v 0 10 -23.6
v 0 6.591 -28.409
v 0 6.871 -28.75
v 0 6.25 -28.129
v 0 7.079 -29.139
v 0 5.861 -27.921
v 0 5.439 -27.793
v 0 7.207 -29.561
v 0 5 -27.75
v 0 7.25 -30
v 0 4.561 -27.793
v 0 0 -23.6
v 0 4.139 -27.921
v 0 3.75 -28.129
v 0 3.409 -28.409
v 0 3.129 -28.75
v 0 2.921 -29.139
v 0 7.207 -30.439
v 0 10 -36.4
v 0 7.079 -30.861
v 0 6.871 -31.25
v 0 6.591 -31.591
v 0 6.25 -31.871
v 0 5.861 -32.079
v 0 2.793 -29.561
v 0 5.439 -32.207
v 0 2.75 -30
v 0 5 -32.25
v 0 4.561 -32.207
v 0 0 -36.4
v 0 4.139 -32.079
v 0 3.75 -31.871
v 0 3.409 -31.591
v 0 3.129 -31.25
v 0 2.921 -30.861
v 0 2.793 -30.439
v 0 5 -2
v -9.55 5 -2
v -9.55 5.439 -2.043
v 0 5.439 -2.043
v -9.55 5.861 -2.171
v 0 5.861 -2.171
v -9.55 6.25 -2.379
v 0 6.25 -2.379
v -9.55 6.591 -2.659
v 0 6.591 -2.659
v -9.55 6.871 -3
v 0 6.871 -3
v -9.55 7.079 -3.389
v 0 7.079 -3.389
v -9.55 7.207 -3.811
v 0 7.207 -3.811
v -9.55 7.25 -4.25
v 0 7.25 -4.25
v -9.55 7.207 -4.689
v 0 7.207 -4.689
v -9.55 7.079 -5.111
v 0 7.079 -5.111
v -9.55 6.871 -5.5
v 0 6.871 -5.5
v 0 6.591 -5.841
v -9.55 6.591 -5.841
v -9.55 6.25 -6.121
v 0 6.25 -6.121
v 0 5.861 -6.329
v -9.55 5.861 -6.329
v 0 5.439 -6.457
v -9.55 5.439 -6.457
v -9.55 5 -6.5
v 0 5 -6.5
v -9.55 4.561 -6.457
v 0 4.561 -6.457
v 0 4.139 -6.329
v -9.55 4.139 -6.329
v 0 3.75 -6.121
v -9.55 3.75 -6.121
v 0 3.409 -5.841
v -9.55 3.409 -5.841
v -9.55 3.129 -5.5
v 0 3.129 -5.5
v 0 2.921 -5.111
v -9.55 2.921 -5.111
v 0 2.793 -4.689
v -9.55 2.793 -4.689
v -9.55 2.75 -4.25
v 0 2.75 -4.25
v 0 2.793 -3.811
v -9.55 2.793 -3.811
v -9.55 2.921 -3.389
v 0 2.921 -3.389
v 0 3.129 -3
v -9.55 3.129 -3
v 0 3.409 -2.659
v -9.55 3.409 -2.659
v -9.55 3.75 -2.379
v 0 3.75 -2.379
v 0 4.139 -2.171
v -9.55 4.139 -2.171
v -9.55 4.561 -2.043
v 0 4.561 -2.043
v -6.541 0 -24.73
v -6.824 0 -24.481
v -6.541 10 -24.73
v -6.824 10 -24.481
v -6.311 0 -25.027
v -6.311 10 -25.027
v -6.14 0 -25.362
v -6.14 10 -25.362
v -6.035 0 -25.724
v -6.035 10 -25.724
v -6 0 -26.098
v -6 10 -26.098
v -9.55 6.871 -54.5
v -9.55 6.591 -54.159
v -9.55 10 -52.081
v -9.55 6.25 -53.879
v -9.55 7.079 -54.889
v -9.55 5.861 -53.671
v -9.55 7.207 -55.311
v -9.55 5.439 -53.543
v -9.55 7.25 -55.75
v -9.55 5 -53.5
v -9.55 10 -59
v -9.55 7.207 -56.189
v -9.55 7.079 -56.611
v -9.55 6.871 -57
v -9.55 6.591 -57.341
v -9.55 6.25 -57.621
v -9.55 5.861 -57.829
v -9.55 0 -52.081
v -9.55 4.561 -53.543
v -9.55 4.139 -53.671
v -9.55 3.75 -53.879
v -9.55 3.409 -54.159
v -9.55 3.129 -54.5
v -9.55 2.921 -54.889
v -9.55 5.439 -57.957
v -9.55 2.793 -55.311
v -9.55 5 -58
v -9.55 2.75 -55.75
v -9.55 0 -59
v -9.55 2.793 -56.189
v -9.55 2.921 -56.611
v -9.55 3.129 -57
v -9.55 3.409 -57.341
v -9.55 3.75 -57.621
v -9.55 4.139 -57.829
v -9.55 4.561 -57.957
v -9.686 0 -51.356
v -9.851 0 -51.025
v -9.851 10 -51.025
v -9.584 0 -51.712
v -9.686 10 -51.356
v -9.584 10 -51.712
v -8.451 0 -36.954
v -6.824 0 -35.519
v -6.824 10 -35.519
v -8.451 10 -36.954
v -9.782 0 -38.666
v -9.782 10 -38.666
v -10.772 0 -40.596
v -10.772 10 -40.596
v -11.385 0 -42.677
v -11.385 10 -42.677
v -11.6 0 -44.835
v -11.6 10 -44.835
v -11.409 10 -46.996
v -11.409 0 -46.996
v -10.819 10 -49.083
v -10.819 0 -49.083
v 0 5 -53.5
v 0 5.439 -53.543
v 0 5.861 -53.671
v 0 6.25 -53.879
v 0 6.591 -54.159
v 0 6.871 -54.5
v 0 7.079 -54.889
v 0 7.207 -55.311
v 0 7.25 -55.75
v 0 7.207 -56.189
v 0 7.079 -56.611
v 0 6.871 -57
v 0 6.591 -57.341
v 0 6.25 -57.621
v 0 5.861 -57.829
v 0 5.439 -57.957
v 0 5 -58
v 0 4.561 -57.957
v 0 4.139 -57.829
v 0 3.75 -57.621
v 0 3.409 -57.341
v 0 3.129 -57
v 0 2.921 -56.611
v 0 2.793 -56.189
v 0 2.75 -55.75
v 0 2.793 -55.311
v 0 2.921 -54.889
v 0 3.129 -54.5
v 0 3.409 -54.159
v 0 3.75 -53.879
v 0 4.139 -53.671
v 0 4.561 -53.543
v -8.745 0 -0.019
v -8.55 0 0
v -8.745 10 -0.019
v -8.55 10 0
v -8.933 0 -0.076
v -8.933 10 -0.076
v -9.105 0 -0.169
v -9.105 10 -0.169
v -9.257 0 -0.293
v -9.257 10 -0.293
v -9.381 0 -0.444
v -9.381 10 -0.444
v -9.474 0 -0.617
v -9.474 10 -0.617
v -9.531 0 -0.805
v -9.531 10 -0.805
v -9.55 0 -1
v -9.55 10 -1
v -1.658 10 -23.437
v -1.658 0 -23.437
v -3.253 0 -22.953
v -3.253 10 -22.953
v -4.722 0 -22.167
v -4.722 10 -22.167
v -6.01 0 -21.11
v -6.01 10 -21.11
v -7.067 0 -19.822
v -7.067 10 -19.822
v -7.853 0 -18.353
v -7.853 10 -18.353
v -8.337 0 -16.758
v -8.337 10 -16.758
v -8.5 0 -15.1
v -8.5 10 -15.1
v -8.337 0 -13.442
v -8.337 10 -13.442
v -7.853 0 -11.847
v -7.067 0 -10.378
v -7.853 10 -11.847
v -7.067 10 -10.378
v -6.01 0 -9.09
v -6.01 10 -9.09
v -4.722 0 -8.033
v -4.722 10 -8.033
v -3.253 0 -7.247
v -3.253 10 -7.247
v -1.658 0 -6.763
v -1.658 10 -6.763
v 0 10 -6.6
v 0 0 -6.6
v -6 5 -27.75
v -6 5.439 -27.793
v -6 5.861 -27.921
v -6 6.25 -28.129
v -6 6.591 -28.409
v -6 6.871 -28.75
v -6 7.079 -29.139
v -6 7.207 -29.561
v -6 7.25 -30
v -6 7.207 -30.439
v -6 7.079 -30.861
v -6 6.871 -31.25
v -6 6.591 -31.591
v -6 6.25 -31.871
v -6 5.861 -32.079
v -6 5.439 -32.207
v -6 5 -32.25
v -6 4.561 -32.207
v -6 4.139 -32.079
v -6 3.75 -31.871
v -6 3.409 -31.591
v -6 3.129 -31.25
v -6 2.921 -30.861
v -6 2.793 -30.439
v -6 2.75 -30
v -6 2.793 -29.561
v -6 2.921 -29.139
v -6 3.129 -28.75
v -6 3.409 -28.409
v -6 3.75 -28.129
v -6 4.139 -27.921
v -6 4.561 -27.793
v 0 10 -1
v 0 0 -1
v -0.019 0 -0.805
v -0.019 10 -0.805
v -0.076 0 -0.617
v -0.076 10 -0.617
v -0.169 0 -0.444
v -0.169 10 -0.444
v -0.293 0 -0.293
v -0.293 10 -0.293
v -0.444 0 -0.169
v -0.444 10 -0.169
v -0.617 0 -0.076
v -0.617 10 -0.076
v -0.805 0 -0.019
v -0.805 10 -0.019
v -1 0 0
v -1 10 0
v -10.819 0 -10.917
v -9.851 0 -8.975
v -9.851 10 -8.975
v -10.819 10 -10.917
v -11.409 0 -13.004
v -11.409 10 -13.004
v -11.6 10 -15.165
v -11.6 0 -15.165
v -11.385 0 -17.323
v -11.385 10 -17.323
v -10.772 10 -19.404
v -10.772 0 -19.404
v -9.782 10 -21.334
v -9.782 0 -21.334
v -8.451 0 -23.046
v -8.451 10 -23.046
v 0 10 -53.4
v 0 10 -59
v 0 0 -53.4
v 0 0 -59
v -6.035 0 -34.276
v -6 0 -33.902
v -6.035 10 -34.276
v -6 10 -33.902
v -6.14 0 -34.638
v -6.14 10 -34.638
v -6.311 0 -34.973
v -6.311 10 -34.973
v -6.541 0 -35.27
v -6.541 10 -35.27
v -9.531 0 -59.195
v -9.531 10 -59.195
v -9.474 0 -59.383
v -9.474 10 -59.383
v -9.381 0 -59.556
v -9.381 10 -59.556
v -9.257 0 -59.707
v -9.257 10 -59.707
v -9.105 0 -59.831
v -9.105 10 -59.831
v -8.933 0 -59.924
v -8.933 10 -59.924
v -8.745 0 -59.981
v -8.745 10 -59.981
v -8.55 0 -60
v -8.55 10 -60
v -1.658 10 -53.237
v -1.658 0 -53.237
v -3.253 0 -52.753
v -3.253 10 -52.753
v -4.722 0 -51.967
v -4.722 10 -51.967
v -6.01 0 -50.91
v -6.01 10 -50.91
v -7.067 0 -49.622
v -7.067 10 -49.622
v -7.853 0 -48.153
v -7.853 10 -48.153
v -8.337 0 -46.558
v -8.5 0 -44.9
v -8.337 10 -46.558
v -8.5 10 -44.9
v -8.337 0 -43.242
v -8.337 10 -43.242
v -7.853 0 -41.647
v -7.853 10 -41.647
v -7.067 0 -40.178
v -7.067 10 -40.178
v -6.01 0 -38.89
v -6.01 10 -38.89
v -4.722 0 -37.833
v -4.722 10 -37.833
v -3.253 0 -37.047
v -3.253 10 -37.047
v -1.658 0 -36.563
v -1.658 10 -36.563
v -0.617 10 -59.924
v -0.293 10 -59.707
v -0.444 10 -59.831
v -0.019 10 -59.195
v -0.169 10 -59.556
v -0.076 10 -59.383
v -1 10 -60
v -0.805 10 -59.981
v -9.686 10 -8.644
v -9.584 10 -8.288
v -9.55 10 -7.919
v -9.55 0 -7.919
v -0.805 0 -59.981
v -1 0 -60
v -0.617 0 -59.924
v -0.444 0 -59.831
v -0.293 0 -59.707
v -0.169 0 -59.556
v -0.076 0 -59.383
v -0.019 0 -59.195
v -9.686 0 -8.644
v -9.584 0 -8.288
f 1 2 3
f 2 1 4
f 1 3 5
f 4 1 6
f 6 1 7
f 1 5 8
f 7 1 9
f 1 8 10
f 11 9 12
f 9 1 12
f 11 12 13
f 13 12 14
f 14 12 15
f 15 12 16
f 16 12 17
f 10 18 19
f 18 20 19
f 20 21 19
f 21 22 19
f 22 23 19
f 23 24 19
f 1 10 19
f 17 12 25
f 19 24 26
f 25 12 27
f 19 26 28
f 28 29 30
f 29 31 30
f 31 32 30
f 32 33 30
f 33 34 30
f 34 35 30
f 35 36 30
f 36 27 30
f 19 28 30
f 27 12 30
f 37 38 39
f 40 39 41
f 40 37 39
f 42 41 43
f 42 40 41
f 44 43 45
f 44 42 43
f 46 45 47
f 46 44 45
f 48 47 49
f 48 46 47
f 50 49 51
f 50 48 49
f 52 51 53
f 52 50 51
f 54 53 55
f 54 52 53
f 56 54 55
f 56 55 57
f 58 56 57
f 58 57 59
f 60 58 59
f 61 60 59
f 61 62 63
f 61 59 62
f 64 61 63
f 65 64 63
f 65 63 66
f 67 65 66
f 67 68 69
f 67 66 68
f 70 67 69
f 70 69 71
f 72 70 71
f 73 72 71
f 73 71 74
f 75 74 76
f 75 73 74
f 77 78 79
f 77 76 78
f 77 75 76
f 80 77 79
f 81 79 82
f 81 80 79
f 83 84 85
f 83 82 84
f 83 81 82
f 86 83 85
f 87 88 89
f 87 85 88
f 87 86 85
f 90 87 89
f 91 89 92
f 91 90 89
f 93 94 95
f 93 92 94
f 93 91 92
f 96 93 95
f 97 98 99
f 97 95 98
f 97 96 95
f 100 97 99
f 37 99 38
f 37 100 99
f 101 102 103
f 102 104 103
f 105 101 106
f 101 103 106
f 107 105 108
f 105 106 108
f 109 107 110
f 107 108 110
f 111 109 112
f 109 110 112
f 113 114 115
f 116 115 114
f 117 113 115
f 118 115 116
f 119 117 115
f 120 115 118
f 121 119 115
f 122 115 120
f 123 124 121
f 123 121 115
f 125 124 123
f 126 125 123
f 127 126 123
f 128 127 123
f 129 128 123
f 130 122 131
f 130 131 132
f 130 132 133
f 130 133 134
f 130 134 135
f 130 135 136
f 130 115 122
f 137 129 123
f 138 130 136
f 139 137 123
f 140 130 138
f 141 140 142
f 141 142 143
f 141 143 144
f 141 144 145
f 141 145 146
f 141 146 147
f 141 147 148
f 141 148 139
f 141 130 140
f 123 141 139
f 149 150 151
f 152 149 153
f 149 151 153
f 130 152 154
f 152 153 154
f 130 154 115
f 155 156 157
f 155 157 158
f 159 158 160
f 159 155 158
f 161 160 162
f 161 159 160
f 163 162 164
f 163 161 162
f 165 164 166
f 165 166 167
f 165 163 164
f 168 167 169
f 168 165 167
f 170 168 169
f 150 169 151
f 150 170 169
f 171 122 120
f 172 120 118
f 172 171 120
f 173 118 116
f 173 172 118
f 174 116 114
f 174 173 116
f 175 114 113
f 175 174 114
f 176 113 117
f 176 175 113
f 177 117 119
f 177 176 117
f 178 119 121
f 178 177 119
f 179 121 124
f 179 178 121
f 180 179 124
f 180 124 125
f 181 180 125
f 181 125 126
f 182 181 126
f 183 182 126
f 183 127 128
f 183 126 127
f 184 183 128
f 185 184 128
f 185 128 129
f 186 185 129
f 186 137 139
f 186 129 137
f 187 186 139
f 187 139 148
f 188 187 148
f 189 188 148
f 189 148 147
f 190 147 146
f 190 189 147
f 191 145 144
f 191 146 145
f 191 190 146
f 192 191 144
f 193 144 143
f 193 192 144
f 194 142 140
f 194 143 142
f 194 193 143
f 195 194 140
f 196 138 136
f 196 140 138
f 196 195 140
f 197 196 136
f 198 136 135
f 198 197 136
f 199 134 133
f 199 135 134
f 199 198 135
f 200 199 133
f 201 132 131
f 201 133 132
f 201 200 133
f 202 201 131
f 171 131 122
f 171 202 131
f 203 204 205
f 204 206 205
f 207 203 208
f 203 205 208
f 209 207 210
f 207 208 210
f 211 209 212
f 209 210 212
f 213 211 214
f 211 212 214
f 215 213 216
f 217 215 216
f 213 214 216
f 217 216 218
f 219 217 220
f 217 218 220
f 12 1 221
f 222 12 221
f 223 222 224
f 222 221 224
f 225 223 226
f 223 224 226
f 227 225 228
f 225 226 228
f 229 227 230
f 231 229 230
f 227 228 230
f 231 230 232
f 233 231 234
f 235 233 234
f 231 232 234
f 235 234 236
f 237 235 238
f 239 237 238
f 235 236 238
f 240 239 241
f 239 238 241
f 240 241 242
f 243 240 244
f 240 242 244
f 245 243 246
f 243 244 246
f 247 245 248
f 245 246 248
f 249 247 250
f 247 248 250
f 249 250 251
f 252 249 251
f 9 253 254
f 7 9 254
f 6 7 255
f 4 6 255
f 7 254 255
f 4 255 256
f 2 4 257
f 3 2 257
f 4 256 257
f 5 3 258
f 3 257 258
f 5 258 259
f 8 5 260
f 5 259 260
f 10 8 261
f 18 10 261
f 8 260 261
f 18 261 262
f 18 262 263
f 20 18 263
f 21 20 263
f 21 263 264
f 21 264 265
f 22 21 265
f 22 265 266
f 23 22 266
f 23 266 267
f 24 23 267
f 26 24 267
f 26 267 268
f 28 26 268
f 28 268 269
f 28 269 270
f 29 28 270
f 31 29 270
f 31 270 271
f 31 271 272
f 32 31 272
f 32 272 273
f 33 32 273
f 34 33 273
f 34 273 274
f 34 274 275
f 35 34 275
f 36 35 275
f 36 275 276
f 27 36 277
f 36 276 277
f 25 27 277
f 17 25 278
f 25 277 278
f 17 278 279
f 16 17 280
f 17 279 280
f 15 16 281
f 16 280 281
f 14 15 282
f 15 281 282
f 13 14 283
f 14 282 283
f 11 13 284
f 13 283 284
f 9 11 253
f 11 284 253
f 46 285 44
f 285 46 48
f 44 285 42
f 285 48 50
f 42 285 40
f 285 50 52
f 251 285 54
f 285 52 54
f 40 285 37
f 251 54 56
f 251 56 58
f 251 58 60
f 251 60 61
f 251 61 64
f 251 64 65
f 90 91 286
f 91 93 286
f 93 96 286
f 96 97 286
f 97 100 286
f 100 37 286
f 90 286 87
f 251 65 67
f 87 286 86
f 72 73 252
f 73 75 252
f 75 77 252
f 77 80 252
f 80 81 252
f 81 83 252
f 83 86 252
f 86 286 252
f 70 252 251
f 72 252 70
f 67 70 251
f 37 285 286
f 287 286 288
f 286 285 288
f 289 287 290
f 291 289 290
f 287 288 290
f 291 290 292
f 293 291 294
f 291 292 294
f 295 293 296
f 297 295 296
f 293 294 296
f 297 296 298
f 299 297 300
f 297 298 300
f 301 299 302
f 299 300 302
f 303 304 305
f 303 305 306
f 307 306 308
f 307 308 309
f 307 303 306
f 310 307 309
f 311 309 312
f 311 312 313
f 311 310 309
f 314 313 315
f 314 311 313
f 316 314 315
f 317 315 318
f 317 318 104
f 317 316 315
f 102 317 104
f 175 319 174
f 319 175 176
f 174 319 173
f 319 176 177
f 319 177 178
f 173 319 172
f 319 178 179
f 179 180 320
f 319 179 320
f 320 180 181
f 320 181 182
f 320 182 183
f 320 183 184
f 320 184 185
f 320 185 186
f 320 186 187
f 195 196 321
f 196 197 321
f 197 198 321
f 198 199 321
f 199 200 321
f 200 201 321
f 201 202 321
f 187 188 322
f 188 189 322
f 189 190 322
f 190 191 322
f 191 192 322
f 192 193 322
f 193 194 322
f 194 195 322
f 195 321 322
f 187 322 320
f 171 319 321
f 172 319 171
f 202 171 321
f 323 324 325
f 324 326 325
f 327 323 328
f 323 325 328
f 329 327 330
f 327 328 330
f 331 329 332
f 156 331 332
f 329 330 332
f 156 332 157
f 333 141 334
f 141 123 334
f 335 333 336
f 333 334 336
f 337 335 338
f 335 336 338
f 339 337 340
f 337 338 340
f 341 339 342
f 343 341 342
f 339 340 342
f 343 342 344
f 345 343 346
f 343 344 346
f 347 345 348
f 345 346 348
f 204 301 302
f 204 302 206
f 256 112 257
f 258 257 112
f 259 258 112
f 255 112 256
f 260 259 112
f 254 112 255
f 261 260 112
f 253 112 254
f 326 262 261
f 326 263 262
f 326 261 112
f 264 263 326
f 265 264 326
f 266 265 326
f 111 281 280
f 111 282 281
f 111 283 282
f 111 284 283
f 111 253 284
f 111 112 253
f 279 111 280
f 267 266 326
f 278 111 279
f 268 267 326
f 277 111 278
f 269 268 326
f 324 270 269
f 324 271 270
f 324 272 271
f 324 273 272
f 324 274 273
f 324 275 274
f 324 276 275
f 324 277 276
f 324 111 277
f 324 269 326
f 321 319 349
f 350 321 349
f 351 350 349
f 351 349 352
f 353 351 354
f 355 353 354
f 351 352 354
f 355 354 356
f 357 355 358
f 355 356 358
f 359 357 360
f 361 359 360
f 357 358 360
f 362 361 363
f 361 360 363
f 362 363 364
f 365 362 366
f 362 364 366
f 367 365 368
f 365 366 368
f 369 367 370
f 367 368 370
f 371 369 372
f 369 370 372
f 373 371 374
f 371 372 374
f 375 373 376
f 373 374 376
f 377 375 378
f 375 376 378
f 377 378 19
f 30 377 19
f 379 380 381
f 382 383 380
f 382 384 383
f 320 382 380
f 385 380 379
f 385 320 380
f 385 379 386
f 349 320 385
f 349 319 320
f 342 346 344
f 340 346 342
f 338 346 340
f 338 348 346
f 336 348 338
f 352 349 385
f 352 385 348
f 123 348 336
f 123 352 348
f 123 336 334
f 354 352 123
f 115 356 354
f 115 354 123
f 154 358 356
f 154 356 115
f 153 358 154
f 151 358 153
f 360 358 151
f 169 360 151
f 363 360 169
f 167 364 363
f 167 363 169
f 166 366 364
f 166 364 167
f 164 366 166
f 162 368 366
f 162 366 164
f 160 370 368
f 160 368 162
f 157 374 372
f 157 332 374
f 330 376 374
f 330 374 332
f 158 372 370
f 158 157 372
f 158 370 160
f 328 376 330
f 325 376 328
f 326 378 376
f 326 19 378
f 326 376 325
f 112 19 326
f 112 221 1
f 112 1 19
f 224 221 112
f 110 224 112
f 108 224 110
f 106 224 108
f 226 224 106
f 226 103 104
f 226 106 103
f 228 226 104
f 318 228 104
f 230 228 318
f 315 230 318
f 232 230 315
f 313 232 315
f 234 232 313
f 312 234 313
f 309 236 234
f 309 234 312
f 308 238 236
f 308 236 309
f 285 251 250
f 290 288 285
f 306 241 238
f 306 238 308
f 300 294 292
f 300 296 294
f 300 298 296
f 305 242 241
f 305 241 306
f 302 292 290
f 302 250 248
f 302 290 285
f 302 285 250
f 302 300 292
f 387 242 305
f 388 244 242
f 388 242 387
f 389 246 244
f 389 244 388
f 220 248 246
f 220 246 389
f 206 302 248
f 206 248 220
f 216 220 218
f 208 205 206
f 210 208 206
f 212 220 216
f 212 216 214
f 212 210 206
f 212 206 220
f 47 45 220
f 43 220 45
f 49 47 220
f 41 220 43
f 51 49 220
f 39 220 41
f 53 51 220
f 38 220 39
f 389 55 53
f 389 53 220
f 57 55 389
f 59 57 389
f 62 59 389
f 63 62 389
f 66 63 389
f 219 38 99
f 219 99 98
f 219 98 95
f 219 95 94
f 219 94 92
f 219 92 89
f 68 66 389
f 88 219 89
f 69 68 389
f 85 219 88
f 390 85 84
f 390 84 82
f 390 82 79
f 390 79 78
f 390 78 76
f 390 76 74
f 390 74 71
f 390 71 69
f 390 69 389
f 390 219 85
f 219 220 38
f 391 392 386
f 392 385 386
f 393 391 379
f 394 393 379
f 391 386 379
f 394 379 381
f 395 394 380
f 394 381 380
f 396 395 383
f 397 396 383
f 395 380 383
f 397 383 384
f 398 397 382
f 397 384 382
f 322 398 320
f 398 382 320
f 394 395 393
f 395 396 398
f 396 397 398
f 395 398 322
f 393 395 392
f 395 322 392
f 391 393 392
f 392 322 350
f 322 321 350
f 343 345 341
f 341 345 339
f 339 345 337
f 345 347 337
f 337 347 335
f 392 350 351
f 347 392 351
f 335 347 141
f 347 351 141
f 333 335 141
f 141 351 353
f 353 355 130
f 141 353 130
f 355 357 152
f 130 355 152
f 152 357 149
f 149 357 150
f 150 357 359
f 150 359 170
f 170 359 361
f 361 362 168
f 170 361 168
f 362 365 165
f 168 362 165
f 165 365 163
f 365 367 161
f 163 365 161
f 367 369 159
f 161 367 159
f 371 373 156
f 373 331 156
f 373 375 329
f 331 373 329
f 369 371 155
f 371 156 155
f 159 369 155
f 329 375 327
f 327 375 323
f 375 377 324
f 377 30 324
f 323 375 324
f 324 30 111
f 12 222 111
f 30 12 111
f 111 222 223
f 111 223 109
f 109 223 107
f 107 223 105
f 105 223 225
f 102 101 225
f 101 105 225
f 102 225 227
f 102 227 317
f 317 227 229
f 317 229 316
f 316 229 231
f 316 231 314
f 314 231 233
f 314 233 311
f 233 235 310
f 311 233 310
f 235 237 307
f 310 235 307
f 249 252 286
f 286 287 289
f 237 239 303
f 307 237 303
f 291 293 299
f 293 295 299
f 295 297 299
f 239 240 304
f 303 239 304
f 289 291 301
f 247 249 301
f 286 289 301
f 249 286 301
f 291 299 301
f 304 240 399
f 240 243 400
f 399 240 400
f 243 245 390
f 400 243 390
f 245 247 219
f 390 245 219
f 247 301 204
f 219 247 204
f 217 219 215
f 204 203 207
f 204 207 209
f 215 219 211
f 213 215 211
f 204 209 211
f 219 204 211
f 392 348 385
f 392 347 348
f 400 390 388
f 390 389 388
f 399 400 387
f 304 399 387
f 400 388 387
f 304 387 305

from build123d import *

# Parameters (mm, degrees)
EXTRUDE_1_DEPTH     = 10
EXTRUDE_2_DEPTH     = 10
EXTRUDE_4_DEPTH     = 10
SKETCH_3_R          = 2.25
CUT_EXTRUDE_4_DEPTH = 12.6
SKETCH_4_R          = 2.25
CUT_EXTRUDE_2_DEPTH = 7
FILLET_2_R          = 1
EXTRUDE_3_DEPTH     = 10
CUT_EXTRUDE_3_DEPTH = 11
FILLET_3_R          = 1
FILLET_4_R          = 2


with BuildPart() as part:
    # Эскиз1 → Бобышка-Вытянуть1 (new body)
    with BuildSketch(Plane(origin=(0, 0, 0), x_dir=(1, 0, 0), z_dir=(0, 1, 0))):
        with BuildLine():
            Line((0, 0), (0, 8))
            ThreePointArc((0, 8), (-7.1, 15.1), (0, 22.2))
            Line((0, 22.2), (0, 37.8))
            ThreePointArc((0, 37.8), (-7.1, 44.9), (0, 52))
            Line((0, 52), (0, 60))
            Line((0, 60), (-3, 60))
            Line((-3, 60), (-3, 54.544169223))
            ThreePointArc((-3, 54.544169223), (-10.1, 44.9), (-3, 35.255830777))
            Line((-3, 35.255830777), (-3, 24.744169223))
            ThreePointArc((-3, 24.744169223), (-10.1, 15.1), (-3, 5.455830777))
            Line((-3, 5.455830777), (-3, 0))
            Line((-3, 0), (0, 0))
        make_face()
    extrude(amount=EXTRUDE_1_DEPTH)

    # Эскиз2 → Бобышка-Вытянуть2 (add)
    with BuildSketch(Plane(origin=(0, 10, 0), x_dir=(1, 0, 0), z_dir=(0, 1, 0))):
        with BuildLine():
            Line((-3, 60), (-8.049844719, 60))
            Line((-8.049844719, 60), (-8.049844719, 51))
            ThreePointArc((-8.049844719, 51), (-5.802159163, 53.167100402), (-3, 54.544169223))
            Line((-3, 54.544169223), (-3, 60))
        make_face()
        with BuildLine():
            Line((-3, 0), (-3, 5.455830777))
            ThreePointArc((-3, 5.455830777), (-5.802159163, 6.832899598), (-8.049844719, 9))
            Line((-8.049844719, 9), (-8.049844719, 0))
            Line((-8.049844719, 0), (-3, 0))
        make_face()
    extrude(amount=-EXTRUDE_2_DEPTH)

    # Эскиз9 → Бобышка-Вытянуть4 (add, through all)
    with BuildSketch(Plane.XZ):
        with BuildLine():
            Line((-6, -25.027738917), (-6, -34.972261083))
            ThreePointArc((-6, -34.972261083), (-11.340897297, -42.461958059), (-9.549844719, -51.484866426))
            Line((-9.549844719, -51.484866426), (-9.549844719, -60))
            Line((-9.549844719, -60), (-8.049844719, -60))
            Line((-8.049844719, -60), (-8.049844719, -51))
            ThreePointArc((-8.049844719, -51), (-9.617405222, -41.81527687), (-3, -35.255830777))
            Line((-3, -35.255830777), (-3, -24.744169223))
            ThreePointArc((-3, -24.744169223), (-9.617405222, -18.18472313), (-8.049844719, -9))
            Line((-8.049844719, -9), (-8.049844719, 0))
            Line((-8.049844719, 0), (-9.549844719, 0))
            Line((-9.549844719, 0), (-9.549844719, -8.515133574))
            ThreePointArc((-9.549844719, -8.515133574), (-11.340897297, -17.538041941), (-6, -25.027738917))
        make_face()
    extrude(amount=-EXTRUDE_4_DEPTH)

    # Эскиз3 → Вырез-Вытянуть4 (cut, through all)
    with BuildSketch(Plane.ZY):
        with Locations((-55.75, 5)):
            Circle(SKETCH_3_R)
        with Locations((-4.25, 5)):
            Circle(SKETCH_3_R)
    extrude(amount=CUT_EXTRUDE_4_DEPTH, mode=Mode.SUBTRACT)

    # Эскиз4 → Вырез-Вытянуть2 (cut, through all)
    with BuildSketch(Plane.ZY.offset(6)):
        with Locations((-30, 5)):
            Circle(SKETCH_4_R)
    extrude(amount=-CUT_EXTRUDE_2_DEPTH, mode=Mode.SUBTRACT)

    # Скругление2
    fillet_2_edges = [part.edges().sort_by_distance(p)[0] for p in [
        (0, 5, -60),
        (0, 5, 0),
    ]]
    fillet(fillet_2_edges, radius=FILLET_2_R)

    # Эскиз5 → Бобышка-Вытянуть3 (add, through all)
    with BuildSketch(Plane.XZ):
        with BuildLine():
            Line((0, -8), (0, -8.1))
            ThreePointArc((0, -8.1), (-7, -15.1), (0, -22.1))
            Line((0, -22.1), (0, -22.2))
            ThreePointArc((0, -22.2), (-7.1, -15.1), (0, -8))
        make_face()
        with BuildLine():
            Line((0, -51.9), (0, -52))
            ThreePointArc((0, -52), (-7.1, -44.9), (0, -37.8))
            Line((0, -37.8), (0, -37.9))
            ThreePointArc((0, -37.9), (-7, -44.9), (0, -51.9))
        make_face()
    extrude(amount=-EXTRUDE_3_DEPTH)

    # Эскиз7 → Вырез-Вытянуть3 (cut, through all)
    with BuildSketch(Plane(origin=(0, 10, 0), x_dir=(1, 0, 0), z_dir=(0, 1, 0))):
        with BuildLine():
            Line((0, 51.9), (0, 53.4))
            ThreePointArc((0, 53.4), (-8.5, 44.9), (0, 36.4))
            Line((0, 36.4), (0, 37.9))
            ThreePointArc((0, 37.9), (-7, 44.9), (0, 51.9))
        make_face()
        with BuildLine():
            Line((0, 22.1), (0, 23.6))
            ThreePointArc((0, 23.6), (-8.5, 15.1), (0, 6.6))
            Line((0, 6.6), (0, 8.1))
            ThreePointArc((0, 8.1), (-7, 15.1), (0, 22.1))
        make_face()
    extrude(amount=-CUT_EXTRUDE_3_DEPTH, mode=Mode.SUBTRACT)

    # Скругление3
    fillet_3_edges = [part.edges().sort_by_distance(p)[0] for p in [
        (-9.549844719, 5, 0),
        (-9.549844719, 5, -60),
    ]]
    fillet(fillet_3_edges, radius=FILLET_3_R)

    # Скругление4
    fillet_4_edges = [part.edges().sort_by_distance(p)[0] for p in [
        (-9.549844719, 5, -8.515133574),
        (-9.549844719, 5, -51.484866426),
        (-6, 5, -34.972261083),
        (-6, 5, -25.027738917),
    ]]
    fillet(fillet_4_edges, radius=FILLET_4_R)


solid = part.part
